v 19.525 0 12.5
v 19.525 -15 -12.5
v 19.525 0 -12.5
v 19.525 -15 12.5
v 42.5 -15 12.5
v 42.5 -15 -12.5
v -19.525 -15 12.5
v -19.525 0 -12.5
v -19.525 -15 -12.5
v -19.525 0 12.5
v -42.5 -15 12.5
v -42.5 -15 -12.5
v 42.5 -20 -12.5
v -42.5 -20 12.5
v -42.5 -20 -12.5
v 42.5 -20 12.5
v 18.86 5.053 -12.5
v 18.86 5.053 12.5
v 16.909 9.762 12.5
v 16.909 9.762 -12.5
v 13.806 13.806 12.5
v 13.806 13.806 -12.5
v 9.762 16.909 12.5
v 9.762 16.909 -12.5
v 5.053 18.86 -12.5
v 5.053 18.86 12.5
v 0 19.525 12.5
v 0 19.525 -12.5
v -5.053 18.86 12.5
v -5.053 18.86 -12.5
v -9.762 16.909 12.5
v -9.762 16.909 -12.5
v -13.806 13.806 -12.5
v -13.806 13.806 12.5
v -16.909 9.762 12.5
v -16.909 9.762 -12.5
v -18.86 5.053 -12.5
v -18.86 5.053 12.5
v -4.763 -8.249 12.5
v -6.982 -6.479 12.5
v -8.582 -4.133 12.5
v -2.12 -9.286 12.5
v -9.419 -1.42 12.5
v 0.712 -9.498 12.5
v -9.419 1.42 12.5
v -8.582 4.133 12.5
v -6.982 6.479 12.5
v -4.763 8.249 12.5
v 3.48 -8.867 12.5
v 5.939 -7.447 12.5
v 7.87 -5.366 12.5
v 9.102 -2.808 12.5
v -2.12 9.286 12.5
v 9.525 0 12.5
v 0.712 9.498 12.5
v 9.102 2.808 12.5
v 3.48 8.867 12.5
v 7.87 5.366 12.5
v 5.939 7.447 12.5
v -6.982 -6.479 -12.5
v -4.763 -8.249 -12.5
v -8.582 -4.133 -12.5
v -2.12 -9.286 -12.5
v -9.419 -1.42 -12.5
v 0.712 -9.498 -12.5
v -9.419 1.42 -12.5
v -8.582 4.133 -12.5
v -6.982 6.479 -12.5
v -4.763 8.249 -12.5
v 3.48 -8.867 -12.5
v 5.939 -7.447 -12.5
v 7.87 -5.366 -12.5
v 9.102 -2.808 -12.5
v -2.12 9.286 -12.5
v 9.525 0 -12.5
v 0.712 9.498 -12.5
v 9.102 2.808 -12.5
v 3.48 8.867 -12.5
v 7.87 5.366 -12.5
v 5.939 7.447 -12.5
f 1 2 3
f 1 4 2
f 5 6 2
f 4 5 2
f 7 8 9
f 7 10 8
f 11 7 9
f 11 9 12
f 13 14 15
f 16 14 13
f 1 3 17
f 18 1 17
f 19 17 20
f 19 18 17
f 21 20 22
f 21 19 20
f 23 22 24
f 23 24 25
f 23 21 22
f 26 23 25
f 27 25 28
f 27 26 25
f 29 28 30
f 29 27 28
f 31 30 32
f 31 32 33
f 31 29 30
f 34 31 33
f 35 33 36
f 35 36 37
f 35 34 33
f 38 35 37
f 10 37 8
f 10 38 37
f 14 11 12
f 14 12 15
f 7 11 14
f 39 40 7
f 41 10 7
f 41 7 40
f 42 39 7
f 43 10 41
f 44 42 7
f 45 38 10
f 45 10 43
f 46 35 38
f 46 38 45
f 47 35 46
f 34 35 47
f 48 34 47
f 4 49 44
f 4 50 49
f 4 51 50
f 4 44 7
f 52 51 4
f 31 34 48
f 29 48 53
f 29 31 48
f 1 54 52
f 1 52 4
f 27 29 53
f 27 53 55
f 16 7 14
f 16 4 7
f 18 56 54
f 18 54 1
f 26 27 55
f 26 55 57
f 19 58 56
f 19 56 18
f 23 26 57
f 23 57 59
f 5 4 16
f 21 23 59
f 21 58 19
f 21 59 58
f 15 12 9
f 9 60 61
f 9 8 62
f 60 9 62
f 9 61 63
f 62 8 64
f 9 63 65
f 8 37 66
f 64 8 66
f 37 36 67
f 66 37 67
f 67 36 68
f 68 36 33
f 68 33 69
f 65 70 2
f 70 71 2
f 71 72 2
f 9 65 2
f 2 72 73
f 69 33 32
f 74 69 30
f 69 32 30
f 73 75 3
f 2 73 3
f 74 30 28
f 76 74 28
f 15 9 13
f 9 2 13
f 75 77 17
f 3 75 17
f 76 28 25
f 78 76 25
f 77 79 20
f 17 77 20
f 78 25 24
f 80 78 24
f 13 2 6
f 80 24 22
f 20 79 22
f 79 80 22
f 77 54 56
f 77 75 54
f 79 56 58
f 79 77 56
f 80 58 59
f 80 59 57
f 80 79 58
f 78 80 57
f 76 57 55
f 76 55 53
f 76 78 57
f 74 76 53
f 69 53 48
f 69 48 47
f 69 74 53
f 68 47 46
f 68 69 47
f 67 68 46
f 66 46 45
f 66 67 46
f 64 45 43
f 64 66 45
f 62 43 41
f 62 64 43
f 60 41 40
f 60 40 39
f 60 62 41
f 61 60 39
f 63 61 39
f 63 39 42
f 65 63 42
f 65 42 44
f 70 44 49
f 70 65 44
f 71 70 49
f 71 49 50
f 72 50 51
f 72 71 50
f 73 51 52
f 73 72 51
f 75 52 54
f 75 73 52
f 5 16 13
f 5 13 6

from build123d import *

# Parameters (mm, degrees)
SKETCH1_R           = 9.525
BOSS_EXTRUDE1_DEPTH = 12.5


with BuildPart() as part:
    # Sketch1 → Boss-Extrude1 (new, symmetric)
    with BuildSketch(Plane.XY):
        with BuildLine():
            Line((-19.525, 0), (-19.525, -15))
            Line((-19.525, -15), (-42.5, -15))
            Line((-42.5, -15), (-42.5, -20))
            Line((-42.5, -20), (42.5, -20))
            Line((42.5, -20), (42.5, -15))
            Line((42.5, -15), (19.525, -15))
            Line((19.525, -15), (19.525, 0))
            ThreePointArc((19.525, 0), (0, 19.525), (-19.525, 0))
        make_face()
        Circle(SKETCH1_R, mode=Mode.SUBTRACT)
    extrude(amount=BOSS_EXTRUDE1_DEPTH, both=True)


solid = part.part
